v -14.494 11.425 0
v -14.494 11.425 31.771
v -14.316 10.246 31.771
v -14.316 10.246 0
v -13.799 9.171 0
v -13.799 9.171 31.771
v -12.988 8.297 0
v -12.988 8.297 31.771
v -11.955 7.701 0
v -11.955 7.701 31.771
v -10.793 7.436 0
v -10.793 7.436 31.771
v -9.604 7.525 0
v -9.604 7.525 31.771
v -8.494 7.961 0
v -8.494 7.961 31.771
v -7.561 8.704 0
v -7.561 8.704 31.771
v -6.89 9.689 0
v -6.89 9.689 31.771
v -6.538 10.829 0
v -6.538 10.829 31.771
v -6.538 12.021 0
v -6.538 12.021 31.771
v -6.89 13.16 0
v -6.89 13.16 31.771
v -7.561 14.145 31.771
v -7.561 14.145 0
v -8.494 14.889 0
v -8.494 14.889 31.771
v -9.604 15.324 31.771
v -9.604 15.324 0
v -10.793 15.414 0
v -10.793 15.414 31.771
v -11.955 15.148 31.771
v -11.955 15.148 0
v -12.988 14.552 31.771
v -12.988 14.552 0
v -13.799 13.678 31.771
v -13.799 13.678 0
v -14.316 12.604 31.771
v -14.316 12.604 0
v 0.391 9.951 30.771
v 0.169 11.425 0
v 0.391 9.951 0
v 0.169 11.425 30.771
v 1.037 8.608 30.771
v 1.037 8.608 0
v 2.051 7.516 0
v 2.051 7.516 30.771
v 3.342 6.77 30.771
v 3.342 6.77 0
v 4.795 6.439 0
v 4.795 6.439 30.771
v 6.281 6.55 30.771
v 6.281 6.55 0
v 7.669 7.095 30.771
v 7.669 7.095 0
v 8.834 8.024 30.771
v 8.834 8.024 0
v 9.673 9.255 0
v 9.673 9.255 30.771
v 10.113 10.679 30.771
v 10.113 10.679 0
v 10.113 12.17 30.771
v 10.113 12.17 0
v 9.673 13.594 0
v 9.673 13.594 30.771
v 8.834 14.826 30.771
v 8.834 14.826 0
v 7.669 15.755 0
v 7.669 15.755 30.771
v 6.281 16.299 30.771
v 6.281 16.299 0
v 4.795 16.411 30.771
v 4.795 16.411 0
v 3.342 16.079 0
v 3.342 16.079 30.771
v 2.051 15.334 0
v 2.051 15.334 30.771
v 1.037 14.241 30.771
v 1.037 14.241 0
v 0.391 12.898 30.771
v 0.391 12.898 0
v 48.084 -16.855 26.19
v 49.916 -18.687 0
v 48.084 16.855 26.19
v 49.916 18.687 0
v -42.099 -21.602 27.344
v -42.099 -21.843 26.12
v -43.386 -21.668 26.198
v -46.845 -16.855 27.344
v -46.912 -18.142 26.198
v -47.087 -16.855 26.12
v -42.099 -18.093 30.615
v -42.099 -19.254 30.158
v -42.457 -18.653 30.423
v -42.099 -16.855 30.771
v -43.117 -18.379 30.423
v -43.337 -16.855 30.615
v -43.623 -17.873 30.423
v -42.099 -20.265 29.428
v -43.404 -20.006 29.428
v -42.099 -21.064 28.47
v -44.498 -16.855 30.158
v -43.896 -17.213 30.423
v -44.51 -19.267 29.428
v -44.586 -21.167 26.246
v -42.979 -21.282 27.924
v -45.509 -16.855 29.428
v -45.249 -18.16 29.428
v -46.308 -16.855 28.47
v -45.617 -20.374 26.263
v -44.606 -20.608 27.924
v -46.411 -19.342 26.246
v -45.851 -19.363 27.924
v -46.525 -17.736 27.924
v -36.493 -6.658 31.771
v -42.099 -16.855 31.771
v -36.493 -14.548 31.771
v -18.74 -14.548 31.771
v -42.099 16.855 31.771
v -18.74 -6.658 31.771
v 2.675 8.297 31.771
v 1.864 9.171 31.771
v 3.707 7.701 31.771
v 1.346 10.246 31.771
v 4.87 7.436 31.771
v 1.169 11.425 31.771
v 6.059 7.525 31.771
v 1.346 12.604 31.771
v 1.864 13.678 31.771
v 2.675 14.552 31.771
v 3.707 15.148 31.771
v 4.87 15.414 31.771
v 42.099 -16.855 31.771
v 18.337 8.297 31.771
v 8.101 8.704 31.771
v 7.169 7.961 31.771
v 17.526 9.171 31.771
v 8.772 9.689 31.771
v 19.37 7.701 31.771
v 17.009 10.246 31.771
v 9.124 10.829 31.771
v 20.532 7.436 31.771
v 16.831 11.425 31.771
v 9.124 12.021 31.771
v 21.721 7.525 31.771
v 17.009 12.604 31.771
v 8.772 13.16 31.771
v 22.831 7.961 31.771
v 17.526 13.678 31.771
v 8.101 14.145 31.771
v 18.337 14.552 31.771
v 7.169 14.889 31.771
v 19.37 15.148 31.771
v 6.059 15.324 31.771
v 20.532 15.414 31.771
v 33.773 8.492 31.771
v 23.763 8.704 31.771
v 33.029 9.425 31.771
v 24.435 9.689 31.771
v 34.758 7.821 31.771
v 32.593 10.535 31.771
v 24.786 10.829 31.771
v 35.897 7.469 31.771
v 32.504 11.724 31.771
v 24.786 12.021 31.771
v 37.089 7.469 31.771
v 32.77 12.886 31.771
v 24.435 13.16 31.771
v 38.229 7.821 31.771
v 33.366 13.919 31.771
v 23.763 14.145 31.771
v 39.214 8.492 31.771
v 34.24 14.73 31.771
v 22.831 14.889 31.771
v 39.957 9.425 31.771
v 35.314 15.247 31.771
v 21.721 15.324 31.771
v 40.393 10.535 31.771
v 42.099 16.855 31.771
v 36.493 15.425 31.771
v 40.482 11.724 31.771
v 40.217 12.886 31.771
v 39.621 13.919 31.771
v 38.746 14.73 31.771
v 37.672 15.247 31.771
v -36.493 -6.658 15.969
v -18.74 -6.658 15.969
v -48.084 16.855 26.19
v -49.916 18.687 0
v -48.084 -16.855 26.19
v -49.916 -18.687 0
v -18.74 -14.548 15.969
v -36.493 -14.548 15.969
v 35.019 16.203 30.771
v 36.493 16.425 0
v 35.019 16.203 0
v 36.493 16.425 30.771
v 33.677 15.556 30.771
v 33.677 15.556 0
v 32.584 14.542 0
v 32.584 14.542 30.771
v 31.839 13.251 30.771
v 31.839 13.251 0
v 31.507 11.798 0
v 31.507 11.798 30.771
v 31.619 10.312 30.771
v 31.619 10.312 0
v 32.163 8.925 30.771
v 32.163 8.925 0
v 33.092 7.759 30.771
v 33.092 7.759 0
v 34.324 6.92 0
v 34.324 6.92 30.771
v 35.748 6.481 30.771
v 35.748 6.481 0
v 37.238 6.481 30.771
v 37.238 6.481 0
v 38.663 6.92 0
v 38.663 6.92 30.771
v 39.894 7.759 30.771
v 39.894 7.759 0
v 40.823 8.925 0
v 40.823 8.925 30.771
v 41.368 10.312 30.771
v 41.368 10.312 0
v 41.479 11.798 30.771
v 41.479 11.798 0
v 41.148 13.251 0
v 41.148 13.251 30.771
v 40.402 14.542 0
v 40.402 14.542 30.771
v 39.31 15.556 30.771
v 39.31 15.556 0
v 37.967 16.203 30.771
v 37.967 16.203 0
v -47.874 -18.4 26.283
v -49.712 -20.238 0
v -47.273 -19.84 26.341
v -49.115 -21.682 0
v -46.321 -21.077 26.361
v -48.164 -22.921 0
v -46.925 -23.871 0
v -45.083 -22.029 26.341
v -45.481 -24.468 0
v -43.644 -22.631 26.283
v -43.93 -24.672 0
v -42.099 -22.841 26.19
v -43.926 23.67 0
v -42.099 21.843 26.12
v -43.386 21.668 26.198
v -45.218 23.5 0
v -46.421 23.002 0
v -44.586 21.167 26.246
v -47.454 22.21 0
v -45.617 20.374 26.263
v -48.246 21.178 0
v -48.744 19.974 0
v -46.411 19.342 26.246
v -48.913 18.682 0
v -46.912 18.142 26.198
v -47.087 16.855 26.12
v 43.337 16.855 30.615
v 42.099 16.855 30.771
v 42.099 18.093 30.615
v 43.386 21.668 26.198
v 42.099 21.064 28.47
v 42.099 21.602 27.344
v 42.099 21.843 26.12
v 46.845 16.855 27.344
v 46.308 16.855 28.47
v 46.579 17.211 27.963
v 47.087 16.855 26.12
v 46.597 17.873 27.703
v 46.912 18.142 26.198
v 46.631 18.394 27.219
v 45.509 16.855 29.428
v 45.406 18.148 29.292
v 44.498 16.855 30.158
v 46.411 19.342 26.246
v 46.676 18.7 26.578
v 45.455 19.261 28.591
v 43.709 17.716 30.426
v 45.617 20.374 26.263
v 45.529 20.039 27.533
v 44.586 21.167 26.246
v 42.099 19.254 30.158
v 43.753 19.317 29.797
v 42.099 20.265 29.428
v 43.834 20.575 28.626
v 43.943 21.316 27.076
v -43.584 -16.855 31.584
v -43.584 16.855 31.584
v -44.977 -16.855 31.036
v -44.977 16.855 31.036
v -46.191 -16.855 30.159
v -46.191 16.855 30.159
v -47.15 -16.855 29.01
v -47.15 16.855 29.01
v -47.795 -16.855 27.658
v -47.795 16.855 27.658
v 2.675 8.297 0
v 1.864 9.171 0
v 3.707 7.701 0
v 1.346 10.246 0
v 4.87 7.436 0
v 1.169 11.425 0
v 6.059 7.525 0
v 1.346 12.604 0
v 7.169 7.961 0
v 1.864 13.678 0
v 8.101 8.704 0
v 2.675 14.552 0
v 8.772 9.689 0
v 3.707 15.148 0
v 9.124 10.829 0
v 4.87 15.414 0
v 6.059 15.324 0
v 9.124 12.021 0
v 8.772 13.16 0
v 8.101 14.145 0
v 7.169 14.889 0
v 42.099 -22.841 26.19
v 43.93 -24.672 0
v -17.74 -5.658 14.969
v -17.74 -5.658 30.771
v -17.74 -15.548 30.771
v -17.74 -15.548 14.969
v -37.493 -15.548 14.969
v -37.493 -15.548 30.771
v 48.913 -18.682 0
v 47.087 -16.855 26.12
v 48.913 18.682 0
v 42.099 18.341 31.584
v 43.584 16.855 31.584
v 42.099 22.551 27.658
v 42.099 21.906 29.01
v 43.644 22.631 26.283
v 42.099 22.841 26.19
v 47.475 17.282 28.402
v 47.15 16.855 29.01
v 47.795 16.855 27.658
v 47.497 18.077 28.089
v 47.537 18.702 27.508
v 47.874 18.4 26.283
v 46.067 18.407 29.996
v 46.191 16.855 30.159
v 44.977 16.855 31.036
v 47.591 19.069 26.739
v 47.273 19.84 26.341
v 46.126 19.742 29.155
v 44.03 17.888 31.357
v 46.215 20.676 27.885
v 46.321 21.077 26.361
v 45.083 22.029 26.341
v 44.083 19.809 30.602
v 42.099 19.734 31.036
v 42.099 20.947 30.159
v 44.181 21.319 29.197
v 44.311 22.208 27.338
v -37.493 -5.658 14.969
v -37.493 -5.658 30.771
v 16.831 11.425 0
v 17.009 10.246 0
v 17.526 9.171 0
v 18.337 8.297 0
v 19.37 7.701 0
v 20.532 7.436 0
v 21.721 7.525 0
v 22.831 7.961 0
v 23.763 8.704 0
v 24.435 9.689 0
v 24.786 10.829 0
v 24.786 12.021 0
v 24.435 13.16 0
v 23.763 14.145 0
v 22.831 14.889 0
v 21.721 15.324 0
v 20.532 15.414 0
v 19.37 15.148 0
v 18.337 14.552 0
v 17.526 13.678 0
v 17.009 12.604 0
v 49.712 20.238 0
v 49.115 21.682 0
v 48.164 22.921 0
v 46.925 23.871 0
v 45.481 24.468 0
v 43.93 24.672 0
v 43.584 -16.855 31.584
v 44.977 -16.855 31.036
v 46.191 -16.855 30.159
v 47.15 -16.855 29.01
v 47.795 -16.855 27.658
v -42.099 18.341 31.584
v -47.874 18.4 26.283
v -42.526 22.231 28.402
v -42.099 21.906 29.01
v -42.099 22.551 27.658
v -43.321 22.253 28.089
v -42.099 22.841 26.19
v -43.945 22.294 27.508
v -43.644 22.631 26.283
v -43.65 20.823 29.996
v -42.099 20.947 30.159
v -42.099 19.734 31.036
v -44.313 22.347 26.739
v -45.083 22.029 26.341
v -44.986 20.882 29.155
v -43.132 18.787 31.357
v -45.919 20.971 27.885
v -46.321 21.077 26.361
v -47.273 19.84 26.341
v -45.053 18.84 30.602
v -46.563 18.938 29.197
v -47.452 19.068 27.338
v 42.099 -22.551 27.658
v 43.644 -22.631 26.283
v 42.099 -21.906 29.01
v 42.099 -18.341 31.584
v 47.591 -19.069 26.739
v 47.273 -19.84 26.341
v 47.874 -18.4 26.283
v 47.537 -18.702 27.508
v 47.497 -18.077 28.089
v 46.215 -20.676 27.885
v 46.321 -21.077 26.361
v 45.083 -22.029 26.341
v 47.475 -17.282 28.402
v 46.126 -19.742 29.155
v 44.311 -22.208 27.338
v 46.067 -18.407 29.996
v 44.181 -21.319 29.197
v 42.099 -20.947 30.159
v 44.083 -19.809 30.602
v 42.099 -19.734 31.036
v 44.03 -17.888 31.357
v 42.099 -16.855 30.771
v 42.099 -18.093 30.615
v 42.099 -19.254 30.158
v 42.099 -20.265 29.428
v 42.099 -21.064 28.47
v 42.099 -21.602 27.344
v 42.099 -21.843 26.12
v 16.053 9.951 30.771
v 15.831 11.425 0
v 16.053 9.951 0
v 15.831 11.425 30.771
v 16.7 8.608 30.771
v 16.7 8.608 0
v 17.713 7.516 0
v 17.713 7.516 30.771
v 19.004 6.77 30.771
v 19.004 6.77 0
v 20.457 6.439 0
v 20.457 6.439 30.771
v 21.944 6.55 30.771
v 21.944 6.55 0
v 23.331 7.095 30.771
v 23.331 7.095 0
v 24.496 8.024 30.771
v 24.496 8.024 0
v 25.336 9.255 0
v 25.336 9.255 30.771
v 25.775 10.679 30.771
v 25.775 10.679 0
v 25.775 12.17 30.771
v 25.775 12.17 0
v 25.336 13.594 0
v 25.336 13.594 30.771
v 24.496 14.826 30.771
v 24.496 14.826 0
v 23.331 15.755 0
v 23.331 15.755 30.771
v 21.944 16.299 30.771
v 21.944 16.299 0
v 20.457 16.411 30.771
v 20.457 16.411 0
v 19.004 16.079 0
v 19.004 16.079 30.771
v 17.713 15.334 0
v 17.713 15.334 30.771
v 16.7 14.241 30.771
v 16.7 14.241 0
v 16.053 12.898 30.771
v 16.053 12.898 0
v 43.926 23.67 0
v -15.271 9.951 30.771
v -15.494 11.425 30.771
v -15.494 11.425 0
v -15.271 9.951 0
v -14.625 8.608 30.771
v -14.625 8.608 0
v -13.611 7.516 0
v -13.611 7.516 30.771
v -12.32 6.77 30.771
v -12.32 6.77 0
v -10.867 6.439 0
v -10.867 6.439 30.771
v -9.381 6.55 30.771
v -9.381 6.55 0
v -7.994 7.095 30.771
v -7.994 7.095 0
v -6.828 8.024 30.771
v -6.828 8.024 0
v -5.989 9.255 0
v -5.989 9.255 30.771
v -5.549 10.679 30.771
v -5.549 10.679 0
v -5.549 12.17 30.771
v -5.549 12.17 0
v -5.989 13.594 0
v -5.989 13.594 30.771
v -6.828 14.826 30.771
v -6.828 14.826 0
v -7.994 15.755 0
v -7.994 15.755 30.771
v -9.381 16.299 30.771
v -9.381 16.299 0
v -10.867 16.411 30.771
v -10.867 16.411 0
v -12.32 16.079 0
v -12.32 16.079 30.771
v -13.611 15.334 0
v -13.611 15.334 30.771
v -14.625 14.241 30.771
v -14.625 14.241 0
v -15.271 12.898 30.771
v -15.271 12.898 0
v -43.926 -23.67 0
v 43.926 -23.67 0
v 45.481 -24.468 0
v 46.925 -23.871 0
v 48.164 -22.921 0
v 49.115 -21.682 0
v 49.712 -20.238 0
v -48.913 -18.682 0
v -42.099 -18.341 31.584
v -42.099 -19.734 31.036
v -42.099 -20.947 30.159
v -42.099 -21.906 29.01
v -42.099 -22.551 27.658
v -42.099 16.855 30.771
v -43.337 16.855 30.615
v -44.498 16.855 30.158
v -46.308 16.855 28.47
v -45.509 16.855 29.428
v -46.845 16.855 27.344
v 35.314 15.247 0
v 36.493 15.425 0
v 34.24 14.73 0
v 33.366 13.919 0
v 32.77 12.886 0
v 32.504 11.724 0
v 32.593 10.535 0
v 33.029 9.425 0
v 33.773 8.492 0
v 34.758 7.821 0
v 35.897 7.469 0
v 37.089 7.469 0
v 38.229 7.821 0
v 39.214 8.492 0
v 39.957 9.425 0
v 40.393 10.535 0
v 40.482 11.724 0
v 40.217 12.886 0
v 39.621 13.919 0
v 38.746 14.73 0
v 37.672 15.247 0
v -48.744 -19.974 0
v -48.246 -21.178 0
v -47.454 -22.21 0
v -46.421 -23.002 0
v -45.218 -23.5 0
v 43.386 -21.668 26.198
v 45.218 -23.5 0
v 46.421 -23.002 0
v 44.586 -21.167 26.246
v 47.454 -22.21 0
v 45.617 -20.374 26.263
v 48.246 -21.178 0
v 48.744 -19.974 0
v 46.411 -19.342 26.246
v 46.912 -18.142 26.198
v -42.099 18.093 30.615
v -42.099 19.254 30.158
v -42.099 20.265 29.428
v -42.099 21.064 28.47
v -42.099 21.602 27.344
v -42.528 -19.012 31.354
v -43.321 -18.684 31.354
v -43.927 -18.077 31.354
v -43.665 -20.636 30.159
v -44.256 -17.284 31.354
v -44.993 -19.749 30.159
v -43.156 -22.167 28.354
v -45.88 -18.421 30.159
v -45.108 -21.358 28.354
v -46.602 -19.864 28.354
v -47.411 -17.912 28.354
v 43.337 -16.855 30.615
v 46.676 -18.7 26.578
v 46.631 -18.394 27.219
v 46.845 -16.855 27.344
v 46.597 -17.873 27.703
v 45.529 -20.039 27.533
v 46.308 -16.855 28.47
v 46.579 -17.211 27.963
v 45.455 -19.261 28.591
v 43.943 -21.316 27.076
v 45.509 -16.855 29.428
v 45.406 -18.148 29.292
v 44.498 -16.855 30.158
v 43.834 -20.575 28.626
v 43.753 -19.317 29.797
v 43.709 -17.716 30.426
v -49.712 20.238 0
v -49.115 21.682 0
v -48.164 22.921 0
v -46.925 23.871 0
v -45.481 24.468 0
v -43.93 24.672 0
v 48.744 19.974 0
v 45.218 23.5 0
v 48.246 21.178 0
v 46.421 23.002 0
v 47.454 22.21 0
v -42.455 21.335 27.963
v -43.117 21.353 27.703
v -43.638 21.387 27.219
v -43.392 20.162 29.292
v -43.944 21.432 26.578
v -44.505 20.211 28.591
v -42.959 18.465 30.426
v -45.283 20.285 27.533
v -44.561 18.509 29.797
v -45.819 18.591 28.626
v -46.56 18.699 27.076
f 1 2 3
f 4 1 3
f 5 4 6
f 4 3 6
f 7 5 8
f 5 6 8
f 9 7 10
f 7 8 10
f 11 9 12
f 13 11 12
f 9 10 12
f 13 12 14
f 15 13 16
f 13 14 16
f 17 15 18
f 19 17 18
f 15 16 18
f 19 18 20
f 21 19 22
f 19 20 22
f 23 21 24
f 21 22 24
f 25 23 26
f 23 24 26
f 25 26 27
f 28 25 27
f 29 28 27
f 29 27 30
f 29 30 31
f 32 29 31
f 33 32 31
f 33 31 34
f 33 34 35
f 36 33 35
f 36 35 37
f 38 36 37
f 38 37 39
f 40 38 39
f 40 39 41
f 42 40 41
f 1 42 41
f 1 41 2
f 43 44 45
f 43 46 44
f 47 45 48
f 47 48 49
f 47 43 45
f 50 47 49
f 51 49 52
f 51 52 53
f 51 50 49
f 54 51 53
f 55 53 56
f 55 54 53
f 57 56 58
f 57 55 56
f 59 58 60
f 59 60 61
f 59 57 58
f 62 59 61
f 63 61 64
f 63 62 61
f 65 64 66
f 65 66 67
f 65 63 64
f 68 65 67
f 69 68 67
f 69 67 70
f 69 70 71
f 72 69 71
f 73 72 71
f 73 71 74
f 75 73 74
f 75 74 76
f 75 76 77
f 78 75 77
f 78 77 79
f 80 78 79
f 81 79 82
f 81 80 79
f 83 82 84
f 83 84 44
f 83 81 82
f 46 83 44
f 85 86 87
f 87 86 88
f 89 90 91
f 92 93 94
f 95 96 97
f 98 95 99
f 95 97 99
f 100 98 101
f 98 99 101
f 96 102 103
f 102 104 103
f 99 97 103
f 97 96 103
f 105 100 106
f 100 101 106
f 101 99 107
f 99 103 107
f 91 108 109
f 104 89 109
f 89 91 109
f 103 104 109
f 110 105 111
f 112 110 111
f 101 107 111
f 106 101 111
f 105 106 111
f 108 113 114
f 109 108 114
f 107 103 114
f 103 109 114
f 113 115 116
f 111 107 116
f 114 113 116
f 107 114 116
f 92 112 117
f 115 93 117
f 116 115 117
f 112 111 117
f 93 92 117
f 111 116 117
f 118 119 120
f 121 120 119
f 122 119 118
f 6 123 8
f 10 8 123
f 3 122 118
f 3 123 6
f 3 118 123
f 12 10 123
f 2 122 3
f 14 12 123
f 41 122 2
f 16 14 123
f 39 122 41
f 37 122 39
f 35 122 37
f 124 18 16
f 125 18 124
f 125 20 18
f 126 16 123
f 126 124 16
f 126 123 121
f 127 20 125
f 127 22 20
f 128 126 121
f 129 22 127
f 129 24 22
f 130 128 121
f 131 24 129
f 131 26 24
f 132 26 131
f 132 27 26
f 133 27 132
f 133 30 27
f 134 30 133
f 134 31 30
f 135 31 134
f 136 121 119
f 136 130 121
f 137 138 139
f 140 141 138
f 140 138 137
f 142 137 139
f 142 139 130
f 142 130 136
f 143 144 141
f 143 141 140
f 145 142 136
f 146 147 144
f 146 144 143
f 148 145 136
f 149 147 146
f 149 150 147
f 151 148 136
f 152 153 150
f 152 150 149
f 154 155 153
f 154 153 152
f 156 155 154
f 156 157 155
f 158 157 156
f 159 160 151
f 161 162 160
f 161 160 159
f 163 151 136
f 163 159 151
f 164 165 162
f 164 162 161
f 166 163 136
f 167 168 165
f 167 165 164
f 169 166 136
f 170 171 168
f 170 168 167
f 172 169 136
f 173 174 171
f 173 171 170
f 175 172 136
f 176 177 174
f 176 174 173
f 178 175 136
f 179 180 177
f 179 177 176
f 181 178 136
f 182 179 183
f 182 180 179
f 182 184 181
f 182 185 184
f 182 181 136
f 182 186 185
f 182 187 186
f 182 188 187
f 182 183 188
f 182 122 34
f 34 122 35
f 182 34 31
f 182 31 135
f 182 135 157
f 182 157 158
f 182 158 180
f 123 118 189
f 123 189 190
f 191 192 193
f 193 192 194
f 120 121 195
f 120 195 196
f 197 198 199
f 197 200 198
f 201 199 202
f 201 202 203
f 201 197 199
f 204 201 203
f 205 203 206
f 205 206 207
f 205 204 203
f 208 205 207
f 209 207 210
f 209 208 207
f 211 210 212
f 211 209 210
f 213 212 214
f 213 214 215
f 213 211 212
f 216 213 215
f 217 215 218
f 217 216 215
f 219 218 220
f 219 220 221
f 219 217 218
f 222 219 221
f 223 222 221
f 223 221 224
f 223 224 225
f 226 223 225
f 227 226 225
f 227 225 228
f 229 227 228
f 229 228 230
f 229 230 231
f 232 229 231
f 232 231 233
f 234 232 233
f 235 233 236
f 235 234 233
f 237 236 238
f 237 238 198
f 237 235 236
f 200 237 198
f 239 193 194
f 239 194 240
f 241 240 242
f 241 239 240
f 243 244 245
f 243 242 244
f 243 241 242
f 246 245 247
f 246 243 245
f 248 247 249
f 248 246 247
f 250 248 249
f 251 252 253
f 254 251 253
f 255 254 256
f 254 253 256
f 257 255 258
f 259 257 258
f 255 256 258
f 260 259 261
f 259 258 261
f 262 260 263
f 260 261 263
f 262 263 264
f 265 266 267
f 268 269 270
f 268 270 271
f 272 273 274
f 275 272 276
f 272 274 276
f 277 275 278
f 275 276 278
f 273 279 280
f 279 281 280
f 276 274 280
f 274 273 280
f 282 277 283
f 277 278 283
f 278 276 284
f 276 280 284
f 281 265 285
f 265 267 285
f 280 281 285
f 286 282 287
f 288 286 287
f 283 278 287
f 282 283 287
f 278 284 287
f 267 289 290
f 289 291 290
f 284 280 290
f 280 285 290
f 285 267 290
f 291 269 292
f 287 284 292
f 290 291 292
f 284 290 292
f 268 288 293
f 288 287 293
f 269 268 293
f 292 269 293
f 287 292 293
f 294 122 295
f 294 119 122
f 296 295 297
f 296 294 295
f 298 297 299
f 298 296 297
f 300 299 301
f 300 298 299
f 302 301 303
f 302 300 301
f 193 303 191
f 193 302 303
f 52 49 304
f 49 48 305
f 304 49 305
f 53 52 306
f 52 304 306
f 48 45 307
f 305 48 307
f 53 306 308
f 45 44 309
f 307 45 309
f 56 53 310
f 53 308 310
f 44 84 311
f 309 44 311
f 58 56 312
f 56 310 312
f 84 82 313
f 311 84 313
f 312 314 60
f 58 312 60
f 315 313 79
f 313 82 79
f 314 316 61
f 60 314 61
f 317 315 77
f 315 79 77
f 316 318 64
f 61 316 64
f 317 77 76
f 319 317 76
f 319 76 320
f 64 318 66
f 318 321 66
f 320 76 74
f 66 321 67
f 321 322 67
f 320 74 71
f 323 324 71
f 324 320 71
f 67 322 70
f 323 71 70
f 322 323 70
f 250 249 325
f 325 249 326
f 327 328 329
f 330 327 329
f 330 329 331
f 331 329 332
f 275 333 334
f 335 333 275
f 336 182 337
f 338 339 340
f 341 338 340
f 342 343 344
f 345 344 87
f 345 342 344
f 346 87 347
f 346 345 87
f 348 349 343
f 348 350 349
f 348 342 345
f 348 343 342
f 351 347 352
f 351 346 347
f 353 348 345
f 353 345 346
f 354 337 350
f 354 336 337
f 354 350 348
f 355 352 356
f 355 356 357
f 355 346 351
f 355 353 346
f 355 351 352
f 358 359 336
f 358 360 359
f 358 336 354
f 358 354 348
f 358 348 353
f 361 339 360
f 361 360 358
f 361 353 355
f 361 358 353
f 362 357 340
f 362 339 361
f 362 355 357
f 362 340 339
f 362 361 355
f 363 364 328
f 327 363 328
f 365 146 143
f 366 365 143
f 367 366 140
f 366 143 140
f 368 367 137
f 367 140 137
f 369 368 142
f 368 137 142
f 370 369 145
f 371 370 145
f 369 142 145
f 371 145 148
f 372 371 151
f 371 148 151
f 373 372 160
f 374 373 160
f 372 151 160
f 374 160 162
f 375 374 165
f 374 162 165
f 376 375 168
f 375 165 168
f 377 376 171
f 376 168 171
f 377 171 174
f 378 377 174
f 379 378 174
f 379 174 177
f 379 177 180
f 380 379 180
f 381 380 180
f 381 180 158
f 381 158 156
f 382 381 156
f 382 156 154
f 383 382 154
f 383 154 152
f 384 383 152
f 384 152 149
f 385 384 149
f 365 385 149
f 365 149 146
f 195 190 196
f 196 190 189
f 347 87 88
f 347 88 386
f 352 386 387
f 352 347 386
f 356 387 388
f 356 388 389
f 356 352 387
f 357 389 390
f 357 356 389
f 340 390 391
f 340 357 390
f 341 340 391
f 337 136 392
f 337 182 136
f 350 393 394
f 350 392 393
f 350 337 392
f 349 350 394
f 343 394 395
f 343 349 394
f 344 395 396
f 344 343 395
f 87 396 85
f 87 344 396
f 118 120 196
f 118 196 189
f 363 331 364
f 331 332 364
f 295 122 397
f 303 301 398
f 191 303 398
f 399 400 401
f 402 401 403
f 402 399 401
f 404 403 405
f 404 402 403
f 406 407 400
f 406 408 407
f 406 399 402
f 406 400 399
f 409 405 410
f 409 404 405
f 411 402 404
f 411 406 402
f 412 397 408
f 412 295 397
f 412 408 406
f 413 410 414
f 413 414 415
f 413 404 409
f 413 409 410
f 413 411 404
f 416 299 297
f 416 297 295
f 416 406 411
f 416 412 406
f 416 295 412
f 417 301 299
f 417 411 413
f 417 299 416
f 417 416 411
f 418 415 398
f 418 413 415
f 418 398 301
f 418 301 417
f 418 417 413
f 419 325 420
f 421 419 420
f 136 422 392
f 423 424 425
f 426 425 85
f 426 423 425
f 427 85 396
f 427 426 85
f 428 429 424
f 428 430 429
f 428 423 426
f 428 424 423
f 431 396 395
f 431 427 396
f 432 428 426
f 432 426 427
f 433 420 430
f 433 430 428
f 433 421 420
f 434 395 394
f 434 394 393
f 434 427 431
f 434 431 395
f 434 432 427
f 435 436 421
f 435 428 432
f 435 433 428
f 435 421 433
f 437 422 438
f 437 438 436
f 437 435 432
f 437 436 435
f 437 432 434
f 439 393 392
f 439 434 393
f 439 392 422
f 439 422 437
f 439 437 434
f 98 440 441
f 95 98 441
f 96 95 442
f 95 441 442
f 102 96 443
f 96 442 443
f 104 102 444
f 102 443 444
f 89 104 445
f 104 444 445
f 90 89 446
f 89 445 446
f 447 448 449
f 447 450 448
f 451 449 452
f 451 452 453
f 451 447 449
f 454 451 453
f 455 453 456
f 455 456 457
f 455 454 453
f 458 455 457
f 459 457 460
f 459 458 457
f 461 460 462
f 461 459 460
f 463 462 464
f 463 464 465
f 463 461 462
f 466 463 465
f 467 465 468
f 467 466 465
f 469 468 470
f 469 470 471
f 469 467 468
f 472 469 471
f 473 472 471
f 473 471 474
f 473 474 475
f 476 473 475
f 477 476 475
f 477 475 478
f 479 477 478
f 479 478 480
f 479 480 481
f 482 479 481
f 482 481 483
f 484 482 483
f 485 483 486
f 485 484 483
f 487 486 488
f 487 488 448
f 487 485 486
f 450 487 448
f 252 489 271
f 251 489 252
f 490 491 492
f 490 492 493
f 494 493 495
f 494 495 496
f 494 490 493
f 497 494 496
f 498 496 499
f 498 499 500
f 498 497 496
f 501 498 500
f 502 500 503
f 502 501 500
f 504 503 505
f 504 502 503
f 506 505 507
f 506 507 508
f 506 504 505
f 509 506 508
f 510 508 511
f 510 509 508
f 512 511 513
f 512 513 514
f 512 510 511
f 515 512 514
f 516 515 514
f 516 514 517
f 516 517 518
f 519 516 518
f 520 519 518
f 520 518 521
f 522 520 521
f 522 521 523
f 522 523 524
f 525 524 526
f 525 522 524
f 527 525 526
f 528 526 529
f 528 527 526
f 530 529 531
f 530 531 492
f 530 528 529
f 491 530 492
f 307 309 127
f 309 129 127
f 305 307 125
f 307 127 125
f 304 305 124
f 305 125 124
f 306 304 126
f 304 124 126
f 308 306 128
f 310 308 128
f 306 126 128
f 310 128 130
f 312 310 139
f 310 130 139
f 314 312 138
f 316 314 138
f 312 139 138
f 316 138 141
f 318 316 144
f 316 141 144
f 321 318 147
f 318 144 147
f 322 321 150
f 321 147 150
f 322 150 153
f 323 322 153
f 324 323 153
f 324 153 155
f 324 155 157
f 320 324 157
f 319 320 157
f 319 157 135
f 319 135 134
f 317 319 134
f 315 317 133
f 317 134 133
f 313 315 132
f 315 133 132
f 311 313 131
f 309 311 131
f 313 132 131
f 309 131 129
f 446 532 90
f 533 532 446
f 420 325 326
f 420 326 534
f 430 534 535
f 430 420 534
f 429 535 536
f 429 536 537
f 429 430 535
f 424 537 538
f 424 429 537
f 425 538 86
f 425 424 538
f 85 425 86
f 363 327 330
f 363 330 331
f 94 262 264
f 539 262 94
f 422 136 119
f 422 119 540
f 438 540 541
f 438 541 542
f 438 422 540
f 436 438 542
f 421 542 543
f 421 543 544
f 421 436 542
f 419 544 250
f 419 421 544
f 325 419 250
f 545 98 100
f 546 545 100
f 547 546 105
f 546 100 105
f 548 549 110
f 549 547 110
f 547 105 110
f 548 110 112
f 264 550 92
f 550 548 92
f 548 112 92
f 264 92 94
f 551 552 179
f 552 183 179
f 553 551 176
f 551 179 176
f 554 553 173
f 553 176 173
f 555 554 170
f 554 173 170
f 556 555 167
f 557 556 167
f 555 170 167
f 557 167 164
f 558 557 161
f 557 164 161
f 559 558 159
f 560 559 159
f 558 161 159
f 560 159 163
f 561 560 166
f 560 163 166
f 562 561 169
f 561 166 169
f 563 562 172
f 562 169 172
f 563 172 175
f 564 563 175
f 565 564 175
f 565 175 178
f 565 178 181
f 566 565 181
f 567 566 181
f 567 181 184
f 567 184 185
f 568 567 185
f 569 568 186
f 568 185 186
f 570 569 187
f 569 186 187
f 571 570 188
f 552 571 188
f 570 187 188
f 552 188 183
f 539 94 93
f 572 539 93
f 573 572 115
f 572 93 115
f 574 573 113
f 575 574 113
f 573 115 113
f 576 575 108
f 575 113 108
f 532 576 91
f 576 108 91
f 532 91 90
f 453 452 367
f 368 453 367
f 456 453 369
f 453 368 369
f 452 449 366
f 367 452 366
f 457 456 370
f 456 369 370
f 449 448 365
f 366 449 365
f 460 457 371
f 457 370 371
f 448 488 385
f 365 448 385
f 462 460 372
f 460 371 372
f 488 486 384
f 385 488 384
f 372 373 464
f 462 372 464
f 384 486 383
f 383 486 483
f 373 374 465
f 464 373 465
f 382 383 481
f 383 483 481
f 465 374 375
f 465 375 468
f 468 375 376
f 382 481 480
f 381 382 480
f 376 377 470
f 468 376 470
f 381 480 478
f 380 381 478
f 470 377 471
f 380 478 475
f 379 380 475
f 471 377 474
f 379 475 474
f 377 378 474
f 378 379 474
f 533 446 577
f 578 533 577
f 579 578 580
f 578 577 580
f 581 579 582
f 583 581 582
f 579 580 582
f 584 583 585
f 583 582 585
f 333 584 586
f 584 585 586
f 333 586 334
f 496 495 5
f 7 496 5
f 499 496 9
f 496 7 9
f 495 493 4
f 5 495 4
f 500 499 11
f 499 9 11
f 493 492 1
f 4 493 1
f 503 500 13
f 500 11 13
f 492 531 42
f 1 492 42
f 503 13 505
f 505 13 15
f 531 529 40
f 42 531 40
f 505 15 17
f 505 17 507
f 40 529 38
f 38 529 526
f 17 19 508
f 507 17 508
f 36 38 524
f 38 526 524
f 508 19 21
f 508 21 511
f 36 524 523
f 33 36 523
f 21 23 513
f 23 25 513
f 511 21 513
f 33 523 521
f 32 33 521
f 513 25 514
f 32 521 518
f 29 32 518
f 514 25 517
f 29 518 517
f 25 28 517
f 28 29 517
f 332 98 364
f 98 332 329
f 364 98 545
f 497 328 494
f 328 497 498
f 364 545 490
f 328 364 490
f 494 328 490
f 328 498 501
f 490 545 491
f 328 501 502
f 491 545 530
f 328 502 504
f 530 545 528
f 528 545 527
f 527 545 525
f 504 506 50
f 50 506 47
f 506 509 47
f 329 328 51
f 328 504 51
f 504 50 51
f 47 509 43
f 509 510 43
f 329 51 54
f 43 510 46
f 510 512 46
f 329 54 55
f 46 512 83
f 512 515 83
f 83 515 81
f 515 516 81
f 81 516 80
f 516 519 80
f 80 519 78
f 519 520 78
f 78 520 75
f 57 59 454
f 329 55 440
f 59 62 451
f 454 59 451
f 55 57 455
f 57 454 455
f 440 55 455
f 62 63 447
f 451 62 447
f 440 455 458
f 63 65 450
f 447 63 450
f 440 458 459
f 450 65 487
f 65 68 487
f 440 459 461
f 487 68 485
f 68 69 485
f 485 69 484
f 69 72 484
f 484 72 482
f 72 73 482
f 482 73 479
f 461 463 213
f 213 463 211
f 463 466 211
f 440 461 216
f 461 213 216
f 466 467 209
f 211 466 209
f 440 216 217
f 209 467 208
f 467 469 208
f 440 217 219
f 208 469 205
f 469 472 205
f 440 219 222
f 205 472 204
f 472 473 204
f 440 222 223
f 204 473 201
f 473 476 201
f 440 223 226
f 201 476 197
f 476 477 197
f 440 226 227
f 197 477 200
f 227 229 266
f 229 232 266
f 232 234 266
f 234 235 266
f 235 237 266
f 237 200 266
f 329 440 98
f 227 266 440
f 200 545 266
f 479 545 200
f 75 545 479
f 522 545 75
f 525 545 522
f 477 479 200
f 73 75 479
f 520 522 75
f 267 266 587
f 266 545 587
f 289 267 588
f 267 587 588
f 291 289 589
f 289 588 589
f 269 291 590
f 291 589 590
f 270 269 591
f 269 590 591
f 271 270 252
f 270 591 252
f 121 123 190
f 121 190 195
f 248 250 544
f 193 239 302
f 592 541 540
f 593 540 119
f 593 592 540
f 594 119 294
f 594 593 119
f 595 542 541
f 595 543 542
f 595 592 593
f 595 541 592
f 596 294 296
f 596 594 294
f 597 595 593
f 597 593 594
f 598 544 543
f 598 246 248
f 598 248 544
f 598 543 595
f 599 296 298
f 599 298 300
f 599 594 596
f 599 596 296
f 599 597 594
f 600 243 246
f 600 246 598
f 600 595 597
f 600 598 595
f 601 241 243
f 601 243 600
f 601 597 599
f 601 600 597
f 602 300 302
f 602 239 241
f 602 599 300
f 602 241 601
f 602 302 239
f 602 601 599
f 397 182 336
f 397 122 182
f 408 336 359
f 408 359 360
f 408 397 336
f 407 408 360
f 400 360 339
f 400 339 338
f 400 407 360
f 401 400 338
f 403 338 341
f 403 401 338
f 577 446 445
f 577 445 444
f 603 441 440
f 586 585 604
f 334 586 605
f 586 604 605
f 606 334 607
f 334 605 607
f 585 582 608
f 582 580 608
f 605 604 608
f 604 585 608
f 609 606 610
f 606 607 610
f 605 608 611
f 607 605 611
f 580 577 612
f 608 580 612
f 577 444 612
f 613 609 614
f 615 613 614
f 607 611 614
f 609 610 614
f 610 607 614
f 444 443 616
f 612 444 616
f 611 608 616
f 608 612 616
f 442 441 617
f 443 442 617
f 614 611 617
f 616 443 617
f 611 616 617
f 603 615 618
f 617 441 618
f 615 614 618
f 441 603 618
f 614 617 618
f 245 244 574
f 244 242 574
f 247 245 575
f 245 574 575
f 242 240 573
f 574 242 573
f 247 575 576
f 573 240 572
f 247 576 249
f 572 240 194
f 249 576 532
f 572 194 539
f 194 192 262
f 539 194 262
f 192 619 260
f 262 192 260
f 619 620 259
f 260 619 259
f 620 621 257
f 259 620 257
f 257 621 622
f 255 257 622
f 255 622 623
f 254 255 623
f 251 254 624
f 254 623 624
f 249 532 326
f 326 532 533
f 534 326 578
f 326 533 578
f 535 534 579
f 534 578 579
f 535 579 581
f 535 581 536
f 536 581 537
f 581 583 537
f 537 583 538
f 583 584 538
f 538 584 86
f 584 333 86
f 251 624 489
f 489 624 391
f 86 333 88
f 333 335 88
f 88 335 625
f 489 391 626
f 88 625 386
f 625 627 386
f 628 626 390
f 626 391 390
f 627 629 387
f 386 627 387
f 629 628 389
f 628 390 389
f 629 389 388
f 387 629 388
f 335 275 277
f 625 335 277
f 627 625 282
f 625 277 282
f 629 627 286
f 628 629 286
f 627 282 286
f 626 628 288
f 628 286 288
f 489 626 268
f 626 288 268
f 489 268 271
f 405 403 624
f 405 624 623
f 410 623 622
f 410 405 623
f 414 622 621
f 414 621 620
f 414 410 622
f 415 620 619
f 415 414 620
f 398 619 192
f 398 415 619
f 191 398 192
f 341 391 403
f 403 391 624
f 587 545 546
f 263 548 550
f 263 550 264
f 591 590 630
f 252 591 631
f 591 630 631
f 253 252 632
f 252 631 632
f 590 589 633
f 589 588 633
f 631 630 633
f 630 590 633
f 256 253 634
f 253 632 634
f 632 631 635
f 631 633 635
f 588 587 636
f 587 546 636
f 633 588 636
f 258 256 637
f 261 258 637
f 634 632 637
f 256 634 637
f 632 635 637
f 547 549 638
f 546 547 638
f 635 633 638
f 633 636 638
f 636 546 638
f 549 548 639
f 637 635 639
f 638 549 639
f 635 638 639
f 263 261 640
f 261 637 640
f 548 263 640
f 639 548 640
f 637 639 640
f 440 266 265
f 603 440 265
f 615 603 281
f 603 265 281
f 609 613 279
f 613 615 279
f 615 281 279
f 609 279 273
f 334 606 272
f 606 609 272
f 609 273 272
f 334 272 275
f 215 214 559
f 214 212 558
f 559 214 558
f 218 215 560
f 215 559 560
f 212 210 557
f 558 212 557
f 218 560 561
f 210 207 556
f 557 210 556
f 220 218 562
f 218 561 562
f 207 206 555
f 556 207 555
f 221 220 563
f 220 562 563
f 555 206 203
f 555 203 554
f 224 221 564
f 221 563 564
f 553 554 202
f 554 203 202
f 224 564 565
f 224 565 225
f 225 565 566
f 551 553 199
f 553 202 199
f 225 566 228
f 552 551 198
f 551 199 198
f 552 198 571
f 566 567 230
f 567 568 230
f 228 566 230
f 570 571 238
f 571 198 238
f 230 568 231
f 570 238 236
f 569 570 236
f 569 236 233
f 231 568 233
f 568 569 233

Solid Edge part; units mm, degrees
sketch "Sketch1" plane through (0, 0, 0) normal (0, 0, 1) x (1, 0, 0)
  line L0 (-49.9158, -24.6721) -> (49.9158, -24.6721)
  line L1 (49.9158, -24.6721) -> (49.9158, 24.6721)
  line L2 (49.9158, 24.6721) -> (-49.9158, 24.6721)
  line L3 (-49.9158, 24.6721) -> (-49.9158, -24.6721)
extrude "Protrusion1" add sketch "Sketch1" along normal blind 31.771
draft "Draft_1" angle 4 neutral plane through (0, 0, 0) normal (0, 0, 1) pull direction (0, 0, 1) face at (49.9158, -16.9415, 26.1581) face at (34.2755, 24.6721, 26.1581) face at (-49.9158, 16.9415, 26.1581) face at (-34.2755, -24.6721, 26.1581)
fillet "Round_1" radius 6 8 edges at (-48.8049, -23.5613, 15.8855) (0, -22.4505, 31.771) (-47.6941, 0, 31.771) (-48.8049, 23.5613, 15.8855) (0, 22.4505, 31.771) (47.6941, 0, 31.771) (48.8049, -23.5613, 15.8855) (48.8049, 23.5613, 15.8855)
sketch "Sketch2" plane through (0, 0, 31.771) normal (0, 0, 1) x (0, 1, 0)
  circle A0 centre (11.4247, -36.4932) radius 4
extrude "ExtrudedCutout_1" cut sketch "Sketch2" against normal blind 65.3593
sketch "Sketch3" plane through (20.8309, 11.4247, 31.771) normal (0, 0, 1) x (-1, 0, 0)
  circle A0 centre (0, 0) radius 4
  circle A1 centre (15.6623, 0) radius 4
  circle A2 centre (31.3245, 0) radius 4
extrude "ExtrudedCutout_2" cut sketch "Sketch3" against normal blind 66.2854
sketch "Sketch4" plane through (0, 0, 31.771) normal (0, 0, 1) x (0, 1, 0)
  line L0 (-6.6575, 36.4932) -> (-6.6575, 18.7397)
  line L1 (-6.6575, 18.7397) -> (-14.5479, 18.7397)
  line L2 (-14.5479, 18.7397) -> (-14.5479, 36.4932)
  line L3 (-14.5479, 36.4932) -> (-6.6575, 36.4932)
extrude "ExtrudedCutout_3" cut sketch "Sketch4" against normal blind 15.8022
shell "Thin_Wall_1" thickness 1 removed faces 1 at (-34.2755, -15.9546, 0)
